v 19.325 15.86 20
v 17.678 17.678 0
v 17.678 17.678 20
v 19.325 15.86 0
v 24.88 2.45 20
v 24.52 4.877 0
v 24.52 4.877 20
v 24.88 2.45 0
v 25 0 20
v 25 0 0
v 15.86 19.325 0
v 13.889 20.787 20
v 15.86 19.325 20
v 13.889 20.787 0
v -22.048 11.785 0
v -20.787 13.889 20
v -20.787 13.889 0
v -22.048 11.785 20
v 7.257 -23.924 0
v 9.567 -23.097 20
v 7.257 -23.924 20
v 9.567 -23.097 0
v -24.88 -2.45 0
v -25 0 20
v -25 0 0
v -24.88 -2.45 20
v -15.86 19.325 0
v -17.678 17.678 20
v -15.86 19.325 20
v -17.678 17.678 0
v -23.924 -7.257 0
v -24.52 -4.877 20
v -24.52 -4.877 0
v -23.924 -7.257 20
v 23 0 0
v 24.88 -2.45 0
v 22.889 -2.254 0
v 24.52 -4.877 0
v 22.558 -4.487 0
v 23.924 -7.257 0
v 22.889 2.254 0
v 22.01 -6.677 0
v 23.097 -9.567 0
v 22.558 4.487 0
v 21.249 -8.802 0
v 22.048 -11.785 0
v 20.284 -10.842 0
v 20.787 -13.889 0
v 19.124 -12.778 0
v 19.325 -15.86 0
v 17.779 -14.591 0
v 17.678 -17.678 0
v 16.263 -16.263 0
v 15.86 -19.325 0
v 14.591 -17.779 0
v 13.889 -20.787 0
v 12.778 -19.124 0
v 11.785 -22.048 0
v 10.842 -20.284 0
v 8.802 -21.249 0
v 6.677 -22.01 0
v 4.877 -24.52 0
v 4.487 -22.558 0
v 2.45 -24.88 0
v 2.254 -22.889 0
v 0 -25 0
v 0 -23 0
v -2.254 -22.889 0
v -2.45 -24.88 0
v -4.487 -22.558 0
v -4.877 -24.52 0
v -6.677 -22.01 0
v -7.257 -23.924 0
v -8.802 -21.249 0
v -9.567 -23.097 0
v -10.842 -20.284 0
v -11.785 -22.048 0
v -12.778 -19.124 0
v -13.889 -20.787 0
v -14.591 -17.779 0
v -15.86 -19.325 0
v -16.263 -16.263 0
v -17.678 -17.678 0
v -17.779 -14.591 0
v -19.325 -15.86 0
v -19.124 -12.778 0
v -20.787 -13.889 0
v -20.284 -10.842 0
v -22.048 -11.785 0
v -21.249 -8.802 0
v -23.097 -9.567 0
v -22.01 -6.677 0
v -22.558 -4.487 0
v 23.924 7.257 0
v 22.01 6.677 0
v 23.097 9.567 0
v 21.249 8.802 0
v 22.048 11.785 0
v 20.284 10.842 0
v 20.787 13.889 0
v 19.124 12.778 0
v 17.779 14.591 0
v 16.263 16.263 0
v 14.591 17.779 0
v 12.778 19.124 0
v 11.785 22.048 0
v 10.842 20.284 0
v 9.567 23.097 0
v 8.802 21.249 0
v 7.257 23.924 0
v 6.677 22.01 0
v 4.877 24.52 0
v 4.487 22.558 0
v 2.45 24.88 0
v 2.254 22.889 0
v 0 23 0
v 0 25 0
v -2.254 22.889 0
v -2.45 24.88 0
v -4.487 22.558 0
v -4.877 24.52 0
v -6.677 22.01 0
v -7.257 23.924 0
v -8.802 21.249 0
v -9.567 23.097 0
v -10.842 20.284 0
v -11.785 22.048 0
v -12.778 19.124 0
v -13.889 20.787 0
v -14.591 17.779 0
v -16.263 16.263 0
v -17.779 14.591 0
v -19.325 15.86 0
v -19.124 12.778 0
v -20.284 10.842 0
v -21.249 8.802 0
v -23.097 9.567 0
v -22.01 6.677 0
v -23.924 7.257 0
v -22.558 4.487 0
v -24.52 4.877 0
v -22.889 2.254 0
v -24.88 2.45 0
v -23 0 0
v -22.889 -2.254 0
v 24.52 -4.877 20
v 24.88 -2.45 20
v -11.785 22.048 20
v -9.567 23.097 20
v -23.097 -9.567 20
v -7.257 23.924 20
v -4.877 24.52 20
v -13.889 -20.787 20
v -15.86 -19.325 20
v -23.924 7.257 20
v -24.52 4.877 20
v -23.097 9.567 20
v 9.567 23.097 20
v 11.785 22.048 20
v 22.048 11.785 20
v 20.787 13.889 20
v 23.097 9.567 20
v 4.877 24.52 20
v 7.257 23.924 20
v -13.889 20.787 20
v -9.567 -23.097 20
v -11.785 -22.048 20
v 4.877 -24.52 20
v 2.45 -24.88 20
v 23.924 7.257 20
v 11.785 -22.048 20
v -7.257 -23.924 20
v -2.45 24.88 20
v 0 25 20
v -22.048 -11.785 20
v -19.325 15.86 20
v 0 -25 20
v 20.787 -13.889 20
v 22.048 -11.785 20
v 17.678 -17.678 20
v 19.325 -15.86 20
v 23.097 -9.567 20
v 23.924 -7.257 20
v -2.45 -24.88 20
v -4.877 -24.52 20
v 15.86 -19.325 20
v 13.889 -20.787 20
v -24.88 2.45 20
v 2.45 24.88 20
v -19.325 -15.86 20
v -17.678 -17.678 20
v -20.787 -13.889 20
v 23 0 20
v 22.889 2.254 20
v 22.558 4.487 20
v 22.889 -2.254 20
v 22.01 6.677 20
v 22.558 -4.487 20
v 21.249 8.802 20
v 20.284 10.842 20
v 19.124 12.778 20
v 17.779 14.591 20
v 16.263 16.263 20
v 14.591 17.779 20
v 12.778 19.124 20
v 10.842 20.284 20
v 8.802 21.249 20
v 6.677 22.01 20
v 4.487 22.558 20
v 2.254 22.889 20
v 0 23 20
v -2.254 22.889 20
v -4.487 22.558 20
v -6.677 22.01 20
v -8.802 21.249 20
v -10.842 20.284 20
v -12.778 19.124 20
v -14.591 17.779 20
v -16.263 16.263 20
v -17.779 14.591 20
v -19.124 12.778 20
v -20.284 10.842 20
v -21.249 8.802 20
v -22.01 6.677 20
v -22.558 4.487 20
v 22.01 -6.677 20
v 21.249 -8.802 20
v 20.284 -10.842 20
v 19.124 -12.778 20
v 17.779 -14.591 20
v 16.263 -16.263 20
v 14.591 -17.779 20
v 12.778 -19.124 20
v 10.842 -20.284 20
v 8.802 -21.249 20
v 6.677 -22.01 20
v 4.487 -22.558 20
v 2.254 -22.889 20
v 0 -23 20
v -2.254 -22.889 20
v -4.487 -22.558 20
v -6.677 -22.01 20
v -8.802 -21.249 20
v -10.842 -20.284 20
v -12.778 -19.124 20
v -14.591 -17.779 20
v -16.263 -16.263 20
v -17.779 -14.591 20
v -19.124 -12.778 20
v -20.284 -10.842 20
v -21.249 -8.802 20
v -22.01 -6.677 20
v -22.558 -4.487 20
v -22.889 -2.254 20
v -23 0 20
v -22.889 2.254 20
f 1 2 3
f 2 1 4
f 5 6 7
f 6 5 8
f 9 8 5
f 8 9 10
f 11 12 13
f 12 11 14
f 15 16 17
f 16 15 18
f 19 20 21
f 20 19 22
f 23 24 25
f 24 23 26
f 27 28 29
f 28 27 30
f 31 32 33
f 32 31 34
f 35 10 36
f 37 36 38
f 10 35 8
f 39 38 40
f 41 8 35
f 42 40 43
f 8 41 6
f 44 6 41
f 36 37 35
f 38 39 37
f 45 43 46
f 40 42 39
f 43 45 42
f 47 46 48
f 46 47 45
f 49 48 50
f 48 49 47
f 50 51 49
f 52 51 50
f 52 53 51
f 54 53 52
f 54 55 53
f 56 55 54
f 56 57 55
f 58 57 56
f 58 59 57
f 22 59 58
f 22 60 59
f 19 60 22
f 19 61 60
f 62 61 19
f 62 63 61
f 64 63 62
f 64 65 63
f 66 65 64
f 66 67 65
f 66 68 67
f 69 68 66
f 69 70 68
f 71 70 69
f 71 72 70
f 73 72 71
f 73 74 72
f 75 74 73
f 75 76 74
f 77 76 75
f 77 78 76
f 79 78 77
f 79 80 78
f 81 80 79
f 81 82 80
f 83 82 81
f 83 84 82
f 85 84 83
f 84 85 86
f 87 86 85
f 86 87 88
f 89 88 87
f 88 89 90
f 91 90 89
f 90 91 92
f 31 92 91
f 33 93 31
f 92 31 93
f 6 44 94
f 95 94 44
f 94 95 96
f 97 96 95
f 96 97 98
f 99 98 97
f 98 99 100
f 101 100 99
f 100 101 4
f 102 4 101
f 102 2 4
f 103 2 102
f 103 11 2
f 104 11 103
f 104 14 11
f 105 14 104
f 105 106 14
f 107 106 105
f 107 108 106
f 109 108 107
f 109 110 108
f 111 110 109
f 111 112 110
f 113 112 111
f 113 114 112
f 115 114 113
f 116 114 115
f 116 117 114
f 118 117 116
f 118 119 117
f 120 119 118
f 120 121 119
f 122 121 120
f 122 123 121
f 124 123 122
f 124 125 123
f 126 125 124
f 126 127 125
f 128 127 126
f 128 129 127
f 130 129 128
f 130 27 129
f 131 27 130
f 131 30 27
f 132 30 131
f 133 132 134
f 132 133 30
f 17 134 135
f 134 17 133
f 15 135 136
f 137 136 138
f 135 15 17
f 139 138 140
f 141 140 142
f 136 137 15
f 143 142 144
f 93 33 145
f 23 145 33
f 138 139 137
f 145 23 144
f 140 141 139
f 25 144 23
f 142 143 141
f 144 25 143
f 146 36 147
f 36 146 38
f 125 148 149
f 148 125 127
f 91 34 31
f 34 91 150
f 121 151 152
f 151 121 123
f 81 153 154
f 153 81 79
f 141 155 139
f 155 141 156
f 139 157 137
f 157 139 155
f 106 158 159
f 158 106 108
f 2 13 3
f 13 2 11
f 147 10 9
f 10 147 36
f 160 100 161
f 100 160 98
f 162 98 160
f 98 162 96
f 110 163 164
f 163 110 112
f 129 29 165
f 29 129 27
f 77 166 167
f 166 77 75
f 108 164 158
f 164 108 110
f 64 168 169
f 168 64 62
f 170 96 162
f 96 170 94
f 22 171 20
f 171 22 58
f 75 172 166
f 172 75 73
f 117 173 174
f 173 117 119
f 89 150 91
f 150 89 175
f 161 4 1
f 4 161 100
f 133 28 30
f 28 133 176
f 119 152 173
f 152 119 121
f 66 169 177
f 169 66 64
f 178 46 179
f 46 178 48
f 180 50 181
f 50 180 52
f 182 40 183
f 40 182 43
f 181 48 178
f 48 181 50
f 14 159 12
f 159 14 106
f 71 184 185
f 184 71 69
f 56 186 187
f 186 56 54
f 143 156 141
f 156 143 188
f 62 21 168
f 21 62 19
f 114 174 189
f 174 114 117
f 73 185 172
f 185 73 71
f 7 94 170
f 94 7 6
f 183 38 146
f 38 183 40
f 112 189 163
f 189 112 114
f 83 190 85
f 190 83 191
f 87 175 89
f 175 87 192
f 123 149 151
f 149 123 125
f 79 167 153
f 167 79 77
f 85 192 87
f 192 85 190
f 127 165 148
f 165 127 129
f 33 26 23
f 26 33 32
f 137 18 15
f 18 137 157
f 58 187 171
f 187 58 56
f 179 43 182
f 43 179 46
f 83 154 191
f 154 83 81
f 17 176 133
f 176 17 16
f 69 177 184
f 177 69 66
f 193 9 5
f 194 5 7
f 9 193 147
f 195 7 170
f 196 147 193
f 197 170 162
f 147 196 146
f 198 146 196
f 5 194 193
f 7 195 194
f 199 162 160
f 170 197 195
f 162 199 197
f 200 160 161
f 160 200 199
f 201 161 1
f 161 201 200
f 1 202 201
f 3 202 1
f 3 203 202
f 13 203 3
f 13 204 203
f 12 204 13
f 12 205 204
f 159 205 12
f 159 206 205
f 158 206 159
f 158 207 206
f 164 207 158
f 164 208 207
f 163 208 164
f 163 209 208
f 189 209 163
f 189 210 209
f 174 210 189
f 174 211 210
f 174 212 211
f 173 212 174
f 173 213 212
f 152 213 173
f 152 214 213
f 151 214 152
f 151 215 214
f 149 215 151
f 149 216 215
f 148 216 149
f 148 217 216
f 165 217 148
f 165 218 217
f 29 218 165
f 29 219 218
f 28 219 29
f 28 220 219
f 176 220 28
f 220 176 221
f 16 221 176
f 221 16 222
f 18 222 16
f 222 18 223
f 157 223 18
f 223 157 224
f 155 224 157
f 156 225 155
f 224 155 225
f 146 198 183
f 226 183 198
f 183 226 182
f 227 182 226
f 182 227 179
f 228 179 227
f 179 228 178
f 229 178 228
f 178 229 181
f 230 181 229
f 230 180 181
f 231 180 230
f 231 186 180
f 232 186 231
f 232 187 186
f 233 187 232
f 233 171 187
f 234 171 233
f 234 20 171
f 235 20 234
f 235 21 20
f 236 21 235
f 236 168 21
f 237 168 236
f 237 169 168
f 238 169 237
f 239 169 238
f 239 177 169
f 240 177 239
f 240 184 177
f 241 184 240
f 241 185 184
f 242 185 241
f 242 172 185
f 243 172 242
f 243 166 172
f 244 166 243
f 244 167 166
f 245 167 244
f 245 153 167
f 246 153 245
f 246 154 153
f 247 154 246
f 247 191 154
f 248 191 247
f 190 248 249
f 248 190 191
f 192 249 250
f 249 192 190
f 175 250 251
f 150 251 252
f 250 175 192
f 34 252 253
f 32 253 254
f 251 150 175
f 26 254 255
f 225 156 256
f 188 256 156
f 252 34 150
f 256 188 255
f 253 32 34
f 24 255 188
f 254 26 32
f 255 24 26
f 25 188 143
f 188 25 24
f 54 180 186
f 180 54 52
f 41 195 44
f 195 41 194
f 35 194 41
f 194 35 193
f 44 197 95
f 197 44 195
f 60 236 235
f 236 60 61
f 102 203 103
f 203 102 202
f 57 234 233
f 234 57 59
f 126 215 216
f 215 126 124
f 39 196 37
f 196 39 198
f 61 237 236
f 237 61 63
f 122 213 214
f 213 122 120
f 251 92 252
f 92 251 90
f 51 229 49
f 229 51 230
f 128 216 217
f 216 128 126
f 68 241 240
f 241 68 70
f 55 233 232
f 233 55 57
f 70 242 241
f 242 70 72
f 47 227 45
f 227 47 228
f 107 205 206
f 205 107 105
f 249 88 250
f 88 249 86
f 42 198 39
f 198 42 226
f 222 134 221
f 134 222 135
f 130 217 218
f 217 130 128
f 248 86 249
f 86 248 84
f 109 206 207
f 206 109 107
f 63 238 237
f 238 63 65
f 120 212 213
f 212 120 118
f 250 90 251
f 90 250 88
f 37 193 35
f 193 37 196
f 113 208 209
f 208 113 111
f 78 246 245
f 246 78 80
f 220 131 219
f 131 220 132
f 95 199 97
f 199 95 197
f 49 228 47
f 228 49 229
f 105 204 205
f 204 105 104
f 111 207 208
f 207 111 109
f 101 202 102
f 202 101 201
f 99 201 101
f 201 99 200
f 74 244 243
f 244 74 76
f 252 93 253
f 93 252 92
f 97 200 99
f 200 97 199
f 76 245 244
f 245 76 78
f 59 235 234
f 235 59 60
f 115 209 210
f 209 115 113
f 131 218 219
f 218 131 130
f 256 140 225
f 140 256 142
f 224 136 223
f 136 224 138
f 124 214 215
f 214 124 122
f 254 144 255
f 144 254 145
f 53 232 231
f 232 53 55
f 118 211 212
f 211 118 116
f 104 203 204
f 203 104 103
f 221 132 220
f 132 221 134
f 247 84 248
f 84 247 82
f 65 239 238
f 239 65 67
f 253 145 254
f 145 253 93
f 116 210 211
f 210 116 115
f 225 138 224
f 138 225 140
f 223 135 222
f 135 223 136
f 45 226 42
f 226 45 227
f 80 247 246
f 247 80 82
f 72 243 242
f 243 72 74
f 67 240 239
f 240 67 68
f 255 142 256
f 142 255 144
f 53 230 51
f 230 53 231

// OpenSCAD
module ht_50_cap() {
    difference() {
        cylinder(h=20, d=50, $fn=64);
        translate([0, 0, -1])
            cylinder(h=21, d=46, $fn=64);
    }
}

ht_50_cap();
